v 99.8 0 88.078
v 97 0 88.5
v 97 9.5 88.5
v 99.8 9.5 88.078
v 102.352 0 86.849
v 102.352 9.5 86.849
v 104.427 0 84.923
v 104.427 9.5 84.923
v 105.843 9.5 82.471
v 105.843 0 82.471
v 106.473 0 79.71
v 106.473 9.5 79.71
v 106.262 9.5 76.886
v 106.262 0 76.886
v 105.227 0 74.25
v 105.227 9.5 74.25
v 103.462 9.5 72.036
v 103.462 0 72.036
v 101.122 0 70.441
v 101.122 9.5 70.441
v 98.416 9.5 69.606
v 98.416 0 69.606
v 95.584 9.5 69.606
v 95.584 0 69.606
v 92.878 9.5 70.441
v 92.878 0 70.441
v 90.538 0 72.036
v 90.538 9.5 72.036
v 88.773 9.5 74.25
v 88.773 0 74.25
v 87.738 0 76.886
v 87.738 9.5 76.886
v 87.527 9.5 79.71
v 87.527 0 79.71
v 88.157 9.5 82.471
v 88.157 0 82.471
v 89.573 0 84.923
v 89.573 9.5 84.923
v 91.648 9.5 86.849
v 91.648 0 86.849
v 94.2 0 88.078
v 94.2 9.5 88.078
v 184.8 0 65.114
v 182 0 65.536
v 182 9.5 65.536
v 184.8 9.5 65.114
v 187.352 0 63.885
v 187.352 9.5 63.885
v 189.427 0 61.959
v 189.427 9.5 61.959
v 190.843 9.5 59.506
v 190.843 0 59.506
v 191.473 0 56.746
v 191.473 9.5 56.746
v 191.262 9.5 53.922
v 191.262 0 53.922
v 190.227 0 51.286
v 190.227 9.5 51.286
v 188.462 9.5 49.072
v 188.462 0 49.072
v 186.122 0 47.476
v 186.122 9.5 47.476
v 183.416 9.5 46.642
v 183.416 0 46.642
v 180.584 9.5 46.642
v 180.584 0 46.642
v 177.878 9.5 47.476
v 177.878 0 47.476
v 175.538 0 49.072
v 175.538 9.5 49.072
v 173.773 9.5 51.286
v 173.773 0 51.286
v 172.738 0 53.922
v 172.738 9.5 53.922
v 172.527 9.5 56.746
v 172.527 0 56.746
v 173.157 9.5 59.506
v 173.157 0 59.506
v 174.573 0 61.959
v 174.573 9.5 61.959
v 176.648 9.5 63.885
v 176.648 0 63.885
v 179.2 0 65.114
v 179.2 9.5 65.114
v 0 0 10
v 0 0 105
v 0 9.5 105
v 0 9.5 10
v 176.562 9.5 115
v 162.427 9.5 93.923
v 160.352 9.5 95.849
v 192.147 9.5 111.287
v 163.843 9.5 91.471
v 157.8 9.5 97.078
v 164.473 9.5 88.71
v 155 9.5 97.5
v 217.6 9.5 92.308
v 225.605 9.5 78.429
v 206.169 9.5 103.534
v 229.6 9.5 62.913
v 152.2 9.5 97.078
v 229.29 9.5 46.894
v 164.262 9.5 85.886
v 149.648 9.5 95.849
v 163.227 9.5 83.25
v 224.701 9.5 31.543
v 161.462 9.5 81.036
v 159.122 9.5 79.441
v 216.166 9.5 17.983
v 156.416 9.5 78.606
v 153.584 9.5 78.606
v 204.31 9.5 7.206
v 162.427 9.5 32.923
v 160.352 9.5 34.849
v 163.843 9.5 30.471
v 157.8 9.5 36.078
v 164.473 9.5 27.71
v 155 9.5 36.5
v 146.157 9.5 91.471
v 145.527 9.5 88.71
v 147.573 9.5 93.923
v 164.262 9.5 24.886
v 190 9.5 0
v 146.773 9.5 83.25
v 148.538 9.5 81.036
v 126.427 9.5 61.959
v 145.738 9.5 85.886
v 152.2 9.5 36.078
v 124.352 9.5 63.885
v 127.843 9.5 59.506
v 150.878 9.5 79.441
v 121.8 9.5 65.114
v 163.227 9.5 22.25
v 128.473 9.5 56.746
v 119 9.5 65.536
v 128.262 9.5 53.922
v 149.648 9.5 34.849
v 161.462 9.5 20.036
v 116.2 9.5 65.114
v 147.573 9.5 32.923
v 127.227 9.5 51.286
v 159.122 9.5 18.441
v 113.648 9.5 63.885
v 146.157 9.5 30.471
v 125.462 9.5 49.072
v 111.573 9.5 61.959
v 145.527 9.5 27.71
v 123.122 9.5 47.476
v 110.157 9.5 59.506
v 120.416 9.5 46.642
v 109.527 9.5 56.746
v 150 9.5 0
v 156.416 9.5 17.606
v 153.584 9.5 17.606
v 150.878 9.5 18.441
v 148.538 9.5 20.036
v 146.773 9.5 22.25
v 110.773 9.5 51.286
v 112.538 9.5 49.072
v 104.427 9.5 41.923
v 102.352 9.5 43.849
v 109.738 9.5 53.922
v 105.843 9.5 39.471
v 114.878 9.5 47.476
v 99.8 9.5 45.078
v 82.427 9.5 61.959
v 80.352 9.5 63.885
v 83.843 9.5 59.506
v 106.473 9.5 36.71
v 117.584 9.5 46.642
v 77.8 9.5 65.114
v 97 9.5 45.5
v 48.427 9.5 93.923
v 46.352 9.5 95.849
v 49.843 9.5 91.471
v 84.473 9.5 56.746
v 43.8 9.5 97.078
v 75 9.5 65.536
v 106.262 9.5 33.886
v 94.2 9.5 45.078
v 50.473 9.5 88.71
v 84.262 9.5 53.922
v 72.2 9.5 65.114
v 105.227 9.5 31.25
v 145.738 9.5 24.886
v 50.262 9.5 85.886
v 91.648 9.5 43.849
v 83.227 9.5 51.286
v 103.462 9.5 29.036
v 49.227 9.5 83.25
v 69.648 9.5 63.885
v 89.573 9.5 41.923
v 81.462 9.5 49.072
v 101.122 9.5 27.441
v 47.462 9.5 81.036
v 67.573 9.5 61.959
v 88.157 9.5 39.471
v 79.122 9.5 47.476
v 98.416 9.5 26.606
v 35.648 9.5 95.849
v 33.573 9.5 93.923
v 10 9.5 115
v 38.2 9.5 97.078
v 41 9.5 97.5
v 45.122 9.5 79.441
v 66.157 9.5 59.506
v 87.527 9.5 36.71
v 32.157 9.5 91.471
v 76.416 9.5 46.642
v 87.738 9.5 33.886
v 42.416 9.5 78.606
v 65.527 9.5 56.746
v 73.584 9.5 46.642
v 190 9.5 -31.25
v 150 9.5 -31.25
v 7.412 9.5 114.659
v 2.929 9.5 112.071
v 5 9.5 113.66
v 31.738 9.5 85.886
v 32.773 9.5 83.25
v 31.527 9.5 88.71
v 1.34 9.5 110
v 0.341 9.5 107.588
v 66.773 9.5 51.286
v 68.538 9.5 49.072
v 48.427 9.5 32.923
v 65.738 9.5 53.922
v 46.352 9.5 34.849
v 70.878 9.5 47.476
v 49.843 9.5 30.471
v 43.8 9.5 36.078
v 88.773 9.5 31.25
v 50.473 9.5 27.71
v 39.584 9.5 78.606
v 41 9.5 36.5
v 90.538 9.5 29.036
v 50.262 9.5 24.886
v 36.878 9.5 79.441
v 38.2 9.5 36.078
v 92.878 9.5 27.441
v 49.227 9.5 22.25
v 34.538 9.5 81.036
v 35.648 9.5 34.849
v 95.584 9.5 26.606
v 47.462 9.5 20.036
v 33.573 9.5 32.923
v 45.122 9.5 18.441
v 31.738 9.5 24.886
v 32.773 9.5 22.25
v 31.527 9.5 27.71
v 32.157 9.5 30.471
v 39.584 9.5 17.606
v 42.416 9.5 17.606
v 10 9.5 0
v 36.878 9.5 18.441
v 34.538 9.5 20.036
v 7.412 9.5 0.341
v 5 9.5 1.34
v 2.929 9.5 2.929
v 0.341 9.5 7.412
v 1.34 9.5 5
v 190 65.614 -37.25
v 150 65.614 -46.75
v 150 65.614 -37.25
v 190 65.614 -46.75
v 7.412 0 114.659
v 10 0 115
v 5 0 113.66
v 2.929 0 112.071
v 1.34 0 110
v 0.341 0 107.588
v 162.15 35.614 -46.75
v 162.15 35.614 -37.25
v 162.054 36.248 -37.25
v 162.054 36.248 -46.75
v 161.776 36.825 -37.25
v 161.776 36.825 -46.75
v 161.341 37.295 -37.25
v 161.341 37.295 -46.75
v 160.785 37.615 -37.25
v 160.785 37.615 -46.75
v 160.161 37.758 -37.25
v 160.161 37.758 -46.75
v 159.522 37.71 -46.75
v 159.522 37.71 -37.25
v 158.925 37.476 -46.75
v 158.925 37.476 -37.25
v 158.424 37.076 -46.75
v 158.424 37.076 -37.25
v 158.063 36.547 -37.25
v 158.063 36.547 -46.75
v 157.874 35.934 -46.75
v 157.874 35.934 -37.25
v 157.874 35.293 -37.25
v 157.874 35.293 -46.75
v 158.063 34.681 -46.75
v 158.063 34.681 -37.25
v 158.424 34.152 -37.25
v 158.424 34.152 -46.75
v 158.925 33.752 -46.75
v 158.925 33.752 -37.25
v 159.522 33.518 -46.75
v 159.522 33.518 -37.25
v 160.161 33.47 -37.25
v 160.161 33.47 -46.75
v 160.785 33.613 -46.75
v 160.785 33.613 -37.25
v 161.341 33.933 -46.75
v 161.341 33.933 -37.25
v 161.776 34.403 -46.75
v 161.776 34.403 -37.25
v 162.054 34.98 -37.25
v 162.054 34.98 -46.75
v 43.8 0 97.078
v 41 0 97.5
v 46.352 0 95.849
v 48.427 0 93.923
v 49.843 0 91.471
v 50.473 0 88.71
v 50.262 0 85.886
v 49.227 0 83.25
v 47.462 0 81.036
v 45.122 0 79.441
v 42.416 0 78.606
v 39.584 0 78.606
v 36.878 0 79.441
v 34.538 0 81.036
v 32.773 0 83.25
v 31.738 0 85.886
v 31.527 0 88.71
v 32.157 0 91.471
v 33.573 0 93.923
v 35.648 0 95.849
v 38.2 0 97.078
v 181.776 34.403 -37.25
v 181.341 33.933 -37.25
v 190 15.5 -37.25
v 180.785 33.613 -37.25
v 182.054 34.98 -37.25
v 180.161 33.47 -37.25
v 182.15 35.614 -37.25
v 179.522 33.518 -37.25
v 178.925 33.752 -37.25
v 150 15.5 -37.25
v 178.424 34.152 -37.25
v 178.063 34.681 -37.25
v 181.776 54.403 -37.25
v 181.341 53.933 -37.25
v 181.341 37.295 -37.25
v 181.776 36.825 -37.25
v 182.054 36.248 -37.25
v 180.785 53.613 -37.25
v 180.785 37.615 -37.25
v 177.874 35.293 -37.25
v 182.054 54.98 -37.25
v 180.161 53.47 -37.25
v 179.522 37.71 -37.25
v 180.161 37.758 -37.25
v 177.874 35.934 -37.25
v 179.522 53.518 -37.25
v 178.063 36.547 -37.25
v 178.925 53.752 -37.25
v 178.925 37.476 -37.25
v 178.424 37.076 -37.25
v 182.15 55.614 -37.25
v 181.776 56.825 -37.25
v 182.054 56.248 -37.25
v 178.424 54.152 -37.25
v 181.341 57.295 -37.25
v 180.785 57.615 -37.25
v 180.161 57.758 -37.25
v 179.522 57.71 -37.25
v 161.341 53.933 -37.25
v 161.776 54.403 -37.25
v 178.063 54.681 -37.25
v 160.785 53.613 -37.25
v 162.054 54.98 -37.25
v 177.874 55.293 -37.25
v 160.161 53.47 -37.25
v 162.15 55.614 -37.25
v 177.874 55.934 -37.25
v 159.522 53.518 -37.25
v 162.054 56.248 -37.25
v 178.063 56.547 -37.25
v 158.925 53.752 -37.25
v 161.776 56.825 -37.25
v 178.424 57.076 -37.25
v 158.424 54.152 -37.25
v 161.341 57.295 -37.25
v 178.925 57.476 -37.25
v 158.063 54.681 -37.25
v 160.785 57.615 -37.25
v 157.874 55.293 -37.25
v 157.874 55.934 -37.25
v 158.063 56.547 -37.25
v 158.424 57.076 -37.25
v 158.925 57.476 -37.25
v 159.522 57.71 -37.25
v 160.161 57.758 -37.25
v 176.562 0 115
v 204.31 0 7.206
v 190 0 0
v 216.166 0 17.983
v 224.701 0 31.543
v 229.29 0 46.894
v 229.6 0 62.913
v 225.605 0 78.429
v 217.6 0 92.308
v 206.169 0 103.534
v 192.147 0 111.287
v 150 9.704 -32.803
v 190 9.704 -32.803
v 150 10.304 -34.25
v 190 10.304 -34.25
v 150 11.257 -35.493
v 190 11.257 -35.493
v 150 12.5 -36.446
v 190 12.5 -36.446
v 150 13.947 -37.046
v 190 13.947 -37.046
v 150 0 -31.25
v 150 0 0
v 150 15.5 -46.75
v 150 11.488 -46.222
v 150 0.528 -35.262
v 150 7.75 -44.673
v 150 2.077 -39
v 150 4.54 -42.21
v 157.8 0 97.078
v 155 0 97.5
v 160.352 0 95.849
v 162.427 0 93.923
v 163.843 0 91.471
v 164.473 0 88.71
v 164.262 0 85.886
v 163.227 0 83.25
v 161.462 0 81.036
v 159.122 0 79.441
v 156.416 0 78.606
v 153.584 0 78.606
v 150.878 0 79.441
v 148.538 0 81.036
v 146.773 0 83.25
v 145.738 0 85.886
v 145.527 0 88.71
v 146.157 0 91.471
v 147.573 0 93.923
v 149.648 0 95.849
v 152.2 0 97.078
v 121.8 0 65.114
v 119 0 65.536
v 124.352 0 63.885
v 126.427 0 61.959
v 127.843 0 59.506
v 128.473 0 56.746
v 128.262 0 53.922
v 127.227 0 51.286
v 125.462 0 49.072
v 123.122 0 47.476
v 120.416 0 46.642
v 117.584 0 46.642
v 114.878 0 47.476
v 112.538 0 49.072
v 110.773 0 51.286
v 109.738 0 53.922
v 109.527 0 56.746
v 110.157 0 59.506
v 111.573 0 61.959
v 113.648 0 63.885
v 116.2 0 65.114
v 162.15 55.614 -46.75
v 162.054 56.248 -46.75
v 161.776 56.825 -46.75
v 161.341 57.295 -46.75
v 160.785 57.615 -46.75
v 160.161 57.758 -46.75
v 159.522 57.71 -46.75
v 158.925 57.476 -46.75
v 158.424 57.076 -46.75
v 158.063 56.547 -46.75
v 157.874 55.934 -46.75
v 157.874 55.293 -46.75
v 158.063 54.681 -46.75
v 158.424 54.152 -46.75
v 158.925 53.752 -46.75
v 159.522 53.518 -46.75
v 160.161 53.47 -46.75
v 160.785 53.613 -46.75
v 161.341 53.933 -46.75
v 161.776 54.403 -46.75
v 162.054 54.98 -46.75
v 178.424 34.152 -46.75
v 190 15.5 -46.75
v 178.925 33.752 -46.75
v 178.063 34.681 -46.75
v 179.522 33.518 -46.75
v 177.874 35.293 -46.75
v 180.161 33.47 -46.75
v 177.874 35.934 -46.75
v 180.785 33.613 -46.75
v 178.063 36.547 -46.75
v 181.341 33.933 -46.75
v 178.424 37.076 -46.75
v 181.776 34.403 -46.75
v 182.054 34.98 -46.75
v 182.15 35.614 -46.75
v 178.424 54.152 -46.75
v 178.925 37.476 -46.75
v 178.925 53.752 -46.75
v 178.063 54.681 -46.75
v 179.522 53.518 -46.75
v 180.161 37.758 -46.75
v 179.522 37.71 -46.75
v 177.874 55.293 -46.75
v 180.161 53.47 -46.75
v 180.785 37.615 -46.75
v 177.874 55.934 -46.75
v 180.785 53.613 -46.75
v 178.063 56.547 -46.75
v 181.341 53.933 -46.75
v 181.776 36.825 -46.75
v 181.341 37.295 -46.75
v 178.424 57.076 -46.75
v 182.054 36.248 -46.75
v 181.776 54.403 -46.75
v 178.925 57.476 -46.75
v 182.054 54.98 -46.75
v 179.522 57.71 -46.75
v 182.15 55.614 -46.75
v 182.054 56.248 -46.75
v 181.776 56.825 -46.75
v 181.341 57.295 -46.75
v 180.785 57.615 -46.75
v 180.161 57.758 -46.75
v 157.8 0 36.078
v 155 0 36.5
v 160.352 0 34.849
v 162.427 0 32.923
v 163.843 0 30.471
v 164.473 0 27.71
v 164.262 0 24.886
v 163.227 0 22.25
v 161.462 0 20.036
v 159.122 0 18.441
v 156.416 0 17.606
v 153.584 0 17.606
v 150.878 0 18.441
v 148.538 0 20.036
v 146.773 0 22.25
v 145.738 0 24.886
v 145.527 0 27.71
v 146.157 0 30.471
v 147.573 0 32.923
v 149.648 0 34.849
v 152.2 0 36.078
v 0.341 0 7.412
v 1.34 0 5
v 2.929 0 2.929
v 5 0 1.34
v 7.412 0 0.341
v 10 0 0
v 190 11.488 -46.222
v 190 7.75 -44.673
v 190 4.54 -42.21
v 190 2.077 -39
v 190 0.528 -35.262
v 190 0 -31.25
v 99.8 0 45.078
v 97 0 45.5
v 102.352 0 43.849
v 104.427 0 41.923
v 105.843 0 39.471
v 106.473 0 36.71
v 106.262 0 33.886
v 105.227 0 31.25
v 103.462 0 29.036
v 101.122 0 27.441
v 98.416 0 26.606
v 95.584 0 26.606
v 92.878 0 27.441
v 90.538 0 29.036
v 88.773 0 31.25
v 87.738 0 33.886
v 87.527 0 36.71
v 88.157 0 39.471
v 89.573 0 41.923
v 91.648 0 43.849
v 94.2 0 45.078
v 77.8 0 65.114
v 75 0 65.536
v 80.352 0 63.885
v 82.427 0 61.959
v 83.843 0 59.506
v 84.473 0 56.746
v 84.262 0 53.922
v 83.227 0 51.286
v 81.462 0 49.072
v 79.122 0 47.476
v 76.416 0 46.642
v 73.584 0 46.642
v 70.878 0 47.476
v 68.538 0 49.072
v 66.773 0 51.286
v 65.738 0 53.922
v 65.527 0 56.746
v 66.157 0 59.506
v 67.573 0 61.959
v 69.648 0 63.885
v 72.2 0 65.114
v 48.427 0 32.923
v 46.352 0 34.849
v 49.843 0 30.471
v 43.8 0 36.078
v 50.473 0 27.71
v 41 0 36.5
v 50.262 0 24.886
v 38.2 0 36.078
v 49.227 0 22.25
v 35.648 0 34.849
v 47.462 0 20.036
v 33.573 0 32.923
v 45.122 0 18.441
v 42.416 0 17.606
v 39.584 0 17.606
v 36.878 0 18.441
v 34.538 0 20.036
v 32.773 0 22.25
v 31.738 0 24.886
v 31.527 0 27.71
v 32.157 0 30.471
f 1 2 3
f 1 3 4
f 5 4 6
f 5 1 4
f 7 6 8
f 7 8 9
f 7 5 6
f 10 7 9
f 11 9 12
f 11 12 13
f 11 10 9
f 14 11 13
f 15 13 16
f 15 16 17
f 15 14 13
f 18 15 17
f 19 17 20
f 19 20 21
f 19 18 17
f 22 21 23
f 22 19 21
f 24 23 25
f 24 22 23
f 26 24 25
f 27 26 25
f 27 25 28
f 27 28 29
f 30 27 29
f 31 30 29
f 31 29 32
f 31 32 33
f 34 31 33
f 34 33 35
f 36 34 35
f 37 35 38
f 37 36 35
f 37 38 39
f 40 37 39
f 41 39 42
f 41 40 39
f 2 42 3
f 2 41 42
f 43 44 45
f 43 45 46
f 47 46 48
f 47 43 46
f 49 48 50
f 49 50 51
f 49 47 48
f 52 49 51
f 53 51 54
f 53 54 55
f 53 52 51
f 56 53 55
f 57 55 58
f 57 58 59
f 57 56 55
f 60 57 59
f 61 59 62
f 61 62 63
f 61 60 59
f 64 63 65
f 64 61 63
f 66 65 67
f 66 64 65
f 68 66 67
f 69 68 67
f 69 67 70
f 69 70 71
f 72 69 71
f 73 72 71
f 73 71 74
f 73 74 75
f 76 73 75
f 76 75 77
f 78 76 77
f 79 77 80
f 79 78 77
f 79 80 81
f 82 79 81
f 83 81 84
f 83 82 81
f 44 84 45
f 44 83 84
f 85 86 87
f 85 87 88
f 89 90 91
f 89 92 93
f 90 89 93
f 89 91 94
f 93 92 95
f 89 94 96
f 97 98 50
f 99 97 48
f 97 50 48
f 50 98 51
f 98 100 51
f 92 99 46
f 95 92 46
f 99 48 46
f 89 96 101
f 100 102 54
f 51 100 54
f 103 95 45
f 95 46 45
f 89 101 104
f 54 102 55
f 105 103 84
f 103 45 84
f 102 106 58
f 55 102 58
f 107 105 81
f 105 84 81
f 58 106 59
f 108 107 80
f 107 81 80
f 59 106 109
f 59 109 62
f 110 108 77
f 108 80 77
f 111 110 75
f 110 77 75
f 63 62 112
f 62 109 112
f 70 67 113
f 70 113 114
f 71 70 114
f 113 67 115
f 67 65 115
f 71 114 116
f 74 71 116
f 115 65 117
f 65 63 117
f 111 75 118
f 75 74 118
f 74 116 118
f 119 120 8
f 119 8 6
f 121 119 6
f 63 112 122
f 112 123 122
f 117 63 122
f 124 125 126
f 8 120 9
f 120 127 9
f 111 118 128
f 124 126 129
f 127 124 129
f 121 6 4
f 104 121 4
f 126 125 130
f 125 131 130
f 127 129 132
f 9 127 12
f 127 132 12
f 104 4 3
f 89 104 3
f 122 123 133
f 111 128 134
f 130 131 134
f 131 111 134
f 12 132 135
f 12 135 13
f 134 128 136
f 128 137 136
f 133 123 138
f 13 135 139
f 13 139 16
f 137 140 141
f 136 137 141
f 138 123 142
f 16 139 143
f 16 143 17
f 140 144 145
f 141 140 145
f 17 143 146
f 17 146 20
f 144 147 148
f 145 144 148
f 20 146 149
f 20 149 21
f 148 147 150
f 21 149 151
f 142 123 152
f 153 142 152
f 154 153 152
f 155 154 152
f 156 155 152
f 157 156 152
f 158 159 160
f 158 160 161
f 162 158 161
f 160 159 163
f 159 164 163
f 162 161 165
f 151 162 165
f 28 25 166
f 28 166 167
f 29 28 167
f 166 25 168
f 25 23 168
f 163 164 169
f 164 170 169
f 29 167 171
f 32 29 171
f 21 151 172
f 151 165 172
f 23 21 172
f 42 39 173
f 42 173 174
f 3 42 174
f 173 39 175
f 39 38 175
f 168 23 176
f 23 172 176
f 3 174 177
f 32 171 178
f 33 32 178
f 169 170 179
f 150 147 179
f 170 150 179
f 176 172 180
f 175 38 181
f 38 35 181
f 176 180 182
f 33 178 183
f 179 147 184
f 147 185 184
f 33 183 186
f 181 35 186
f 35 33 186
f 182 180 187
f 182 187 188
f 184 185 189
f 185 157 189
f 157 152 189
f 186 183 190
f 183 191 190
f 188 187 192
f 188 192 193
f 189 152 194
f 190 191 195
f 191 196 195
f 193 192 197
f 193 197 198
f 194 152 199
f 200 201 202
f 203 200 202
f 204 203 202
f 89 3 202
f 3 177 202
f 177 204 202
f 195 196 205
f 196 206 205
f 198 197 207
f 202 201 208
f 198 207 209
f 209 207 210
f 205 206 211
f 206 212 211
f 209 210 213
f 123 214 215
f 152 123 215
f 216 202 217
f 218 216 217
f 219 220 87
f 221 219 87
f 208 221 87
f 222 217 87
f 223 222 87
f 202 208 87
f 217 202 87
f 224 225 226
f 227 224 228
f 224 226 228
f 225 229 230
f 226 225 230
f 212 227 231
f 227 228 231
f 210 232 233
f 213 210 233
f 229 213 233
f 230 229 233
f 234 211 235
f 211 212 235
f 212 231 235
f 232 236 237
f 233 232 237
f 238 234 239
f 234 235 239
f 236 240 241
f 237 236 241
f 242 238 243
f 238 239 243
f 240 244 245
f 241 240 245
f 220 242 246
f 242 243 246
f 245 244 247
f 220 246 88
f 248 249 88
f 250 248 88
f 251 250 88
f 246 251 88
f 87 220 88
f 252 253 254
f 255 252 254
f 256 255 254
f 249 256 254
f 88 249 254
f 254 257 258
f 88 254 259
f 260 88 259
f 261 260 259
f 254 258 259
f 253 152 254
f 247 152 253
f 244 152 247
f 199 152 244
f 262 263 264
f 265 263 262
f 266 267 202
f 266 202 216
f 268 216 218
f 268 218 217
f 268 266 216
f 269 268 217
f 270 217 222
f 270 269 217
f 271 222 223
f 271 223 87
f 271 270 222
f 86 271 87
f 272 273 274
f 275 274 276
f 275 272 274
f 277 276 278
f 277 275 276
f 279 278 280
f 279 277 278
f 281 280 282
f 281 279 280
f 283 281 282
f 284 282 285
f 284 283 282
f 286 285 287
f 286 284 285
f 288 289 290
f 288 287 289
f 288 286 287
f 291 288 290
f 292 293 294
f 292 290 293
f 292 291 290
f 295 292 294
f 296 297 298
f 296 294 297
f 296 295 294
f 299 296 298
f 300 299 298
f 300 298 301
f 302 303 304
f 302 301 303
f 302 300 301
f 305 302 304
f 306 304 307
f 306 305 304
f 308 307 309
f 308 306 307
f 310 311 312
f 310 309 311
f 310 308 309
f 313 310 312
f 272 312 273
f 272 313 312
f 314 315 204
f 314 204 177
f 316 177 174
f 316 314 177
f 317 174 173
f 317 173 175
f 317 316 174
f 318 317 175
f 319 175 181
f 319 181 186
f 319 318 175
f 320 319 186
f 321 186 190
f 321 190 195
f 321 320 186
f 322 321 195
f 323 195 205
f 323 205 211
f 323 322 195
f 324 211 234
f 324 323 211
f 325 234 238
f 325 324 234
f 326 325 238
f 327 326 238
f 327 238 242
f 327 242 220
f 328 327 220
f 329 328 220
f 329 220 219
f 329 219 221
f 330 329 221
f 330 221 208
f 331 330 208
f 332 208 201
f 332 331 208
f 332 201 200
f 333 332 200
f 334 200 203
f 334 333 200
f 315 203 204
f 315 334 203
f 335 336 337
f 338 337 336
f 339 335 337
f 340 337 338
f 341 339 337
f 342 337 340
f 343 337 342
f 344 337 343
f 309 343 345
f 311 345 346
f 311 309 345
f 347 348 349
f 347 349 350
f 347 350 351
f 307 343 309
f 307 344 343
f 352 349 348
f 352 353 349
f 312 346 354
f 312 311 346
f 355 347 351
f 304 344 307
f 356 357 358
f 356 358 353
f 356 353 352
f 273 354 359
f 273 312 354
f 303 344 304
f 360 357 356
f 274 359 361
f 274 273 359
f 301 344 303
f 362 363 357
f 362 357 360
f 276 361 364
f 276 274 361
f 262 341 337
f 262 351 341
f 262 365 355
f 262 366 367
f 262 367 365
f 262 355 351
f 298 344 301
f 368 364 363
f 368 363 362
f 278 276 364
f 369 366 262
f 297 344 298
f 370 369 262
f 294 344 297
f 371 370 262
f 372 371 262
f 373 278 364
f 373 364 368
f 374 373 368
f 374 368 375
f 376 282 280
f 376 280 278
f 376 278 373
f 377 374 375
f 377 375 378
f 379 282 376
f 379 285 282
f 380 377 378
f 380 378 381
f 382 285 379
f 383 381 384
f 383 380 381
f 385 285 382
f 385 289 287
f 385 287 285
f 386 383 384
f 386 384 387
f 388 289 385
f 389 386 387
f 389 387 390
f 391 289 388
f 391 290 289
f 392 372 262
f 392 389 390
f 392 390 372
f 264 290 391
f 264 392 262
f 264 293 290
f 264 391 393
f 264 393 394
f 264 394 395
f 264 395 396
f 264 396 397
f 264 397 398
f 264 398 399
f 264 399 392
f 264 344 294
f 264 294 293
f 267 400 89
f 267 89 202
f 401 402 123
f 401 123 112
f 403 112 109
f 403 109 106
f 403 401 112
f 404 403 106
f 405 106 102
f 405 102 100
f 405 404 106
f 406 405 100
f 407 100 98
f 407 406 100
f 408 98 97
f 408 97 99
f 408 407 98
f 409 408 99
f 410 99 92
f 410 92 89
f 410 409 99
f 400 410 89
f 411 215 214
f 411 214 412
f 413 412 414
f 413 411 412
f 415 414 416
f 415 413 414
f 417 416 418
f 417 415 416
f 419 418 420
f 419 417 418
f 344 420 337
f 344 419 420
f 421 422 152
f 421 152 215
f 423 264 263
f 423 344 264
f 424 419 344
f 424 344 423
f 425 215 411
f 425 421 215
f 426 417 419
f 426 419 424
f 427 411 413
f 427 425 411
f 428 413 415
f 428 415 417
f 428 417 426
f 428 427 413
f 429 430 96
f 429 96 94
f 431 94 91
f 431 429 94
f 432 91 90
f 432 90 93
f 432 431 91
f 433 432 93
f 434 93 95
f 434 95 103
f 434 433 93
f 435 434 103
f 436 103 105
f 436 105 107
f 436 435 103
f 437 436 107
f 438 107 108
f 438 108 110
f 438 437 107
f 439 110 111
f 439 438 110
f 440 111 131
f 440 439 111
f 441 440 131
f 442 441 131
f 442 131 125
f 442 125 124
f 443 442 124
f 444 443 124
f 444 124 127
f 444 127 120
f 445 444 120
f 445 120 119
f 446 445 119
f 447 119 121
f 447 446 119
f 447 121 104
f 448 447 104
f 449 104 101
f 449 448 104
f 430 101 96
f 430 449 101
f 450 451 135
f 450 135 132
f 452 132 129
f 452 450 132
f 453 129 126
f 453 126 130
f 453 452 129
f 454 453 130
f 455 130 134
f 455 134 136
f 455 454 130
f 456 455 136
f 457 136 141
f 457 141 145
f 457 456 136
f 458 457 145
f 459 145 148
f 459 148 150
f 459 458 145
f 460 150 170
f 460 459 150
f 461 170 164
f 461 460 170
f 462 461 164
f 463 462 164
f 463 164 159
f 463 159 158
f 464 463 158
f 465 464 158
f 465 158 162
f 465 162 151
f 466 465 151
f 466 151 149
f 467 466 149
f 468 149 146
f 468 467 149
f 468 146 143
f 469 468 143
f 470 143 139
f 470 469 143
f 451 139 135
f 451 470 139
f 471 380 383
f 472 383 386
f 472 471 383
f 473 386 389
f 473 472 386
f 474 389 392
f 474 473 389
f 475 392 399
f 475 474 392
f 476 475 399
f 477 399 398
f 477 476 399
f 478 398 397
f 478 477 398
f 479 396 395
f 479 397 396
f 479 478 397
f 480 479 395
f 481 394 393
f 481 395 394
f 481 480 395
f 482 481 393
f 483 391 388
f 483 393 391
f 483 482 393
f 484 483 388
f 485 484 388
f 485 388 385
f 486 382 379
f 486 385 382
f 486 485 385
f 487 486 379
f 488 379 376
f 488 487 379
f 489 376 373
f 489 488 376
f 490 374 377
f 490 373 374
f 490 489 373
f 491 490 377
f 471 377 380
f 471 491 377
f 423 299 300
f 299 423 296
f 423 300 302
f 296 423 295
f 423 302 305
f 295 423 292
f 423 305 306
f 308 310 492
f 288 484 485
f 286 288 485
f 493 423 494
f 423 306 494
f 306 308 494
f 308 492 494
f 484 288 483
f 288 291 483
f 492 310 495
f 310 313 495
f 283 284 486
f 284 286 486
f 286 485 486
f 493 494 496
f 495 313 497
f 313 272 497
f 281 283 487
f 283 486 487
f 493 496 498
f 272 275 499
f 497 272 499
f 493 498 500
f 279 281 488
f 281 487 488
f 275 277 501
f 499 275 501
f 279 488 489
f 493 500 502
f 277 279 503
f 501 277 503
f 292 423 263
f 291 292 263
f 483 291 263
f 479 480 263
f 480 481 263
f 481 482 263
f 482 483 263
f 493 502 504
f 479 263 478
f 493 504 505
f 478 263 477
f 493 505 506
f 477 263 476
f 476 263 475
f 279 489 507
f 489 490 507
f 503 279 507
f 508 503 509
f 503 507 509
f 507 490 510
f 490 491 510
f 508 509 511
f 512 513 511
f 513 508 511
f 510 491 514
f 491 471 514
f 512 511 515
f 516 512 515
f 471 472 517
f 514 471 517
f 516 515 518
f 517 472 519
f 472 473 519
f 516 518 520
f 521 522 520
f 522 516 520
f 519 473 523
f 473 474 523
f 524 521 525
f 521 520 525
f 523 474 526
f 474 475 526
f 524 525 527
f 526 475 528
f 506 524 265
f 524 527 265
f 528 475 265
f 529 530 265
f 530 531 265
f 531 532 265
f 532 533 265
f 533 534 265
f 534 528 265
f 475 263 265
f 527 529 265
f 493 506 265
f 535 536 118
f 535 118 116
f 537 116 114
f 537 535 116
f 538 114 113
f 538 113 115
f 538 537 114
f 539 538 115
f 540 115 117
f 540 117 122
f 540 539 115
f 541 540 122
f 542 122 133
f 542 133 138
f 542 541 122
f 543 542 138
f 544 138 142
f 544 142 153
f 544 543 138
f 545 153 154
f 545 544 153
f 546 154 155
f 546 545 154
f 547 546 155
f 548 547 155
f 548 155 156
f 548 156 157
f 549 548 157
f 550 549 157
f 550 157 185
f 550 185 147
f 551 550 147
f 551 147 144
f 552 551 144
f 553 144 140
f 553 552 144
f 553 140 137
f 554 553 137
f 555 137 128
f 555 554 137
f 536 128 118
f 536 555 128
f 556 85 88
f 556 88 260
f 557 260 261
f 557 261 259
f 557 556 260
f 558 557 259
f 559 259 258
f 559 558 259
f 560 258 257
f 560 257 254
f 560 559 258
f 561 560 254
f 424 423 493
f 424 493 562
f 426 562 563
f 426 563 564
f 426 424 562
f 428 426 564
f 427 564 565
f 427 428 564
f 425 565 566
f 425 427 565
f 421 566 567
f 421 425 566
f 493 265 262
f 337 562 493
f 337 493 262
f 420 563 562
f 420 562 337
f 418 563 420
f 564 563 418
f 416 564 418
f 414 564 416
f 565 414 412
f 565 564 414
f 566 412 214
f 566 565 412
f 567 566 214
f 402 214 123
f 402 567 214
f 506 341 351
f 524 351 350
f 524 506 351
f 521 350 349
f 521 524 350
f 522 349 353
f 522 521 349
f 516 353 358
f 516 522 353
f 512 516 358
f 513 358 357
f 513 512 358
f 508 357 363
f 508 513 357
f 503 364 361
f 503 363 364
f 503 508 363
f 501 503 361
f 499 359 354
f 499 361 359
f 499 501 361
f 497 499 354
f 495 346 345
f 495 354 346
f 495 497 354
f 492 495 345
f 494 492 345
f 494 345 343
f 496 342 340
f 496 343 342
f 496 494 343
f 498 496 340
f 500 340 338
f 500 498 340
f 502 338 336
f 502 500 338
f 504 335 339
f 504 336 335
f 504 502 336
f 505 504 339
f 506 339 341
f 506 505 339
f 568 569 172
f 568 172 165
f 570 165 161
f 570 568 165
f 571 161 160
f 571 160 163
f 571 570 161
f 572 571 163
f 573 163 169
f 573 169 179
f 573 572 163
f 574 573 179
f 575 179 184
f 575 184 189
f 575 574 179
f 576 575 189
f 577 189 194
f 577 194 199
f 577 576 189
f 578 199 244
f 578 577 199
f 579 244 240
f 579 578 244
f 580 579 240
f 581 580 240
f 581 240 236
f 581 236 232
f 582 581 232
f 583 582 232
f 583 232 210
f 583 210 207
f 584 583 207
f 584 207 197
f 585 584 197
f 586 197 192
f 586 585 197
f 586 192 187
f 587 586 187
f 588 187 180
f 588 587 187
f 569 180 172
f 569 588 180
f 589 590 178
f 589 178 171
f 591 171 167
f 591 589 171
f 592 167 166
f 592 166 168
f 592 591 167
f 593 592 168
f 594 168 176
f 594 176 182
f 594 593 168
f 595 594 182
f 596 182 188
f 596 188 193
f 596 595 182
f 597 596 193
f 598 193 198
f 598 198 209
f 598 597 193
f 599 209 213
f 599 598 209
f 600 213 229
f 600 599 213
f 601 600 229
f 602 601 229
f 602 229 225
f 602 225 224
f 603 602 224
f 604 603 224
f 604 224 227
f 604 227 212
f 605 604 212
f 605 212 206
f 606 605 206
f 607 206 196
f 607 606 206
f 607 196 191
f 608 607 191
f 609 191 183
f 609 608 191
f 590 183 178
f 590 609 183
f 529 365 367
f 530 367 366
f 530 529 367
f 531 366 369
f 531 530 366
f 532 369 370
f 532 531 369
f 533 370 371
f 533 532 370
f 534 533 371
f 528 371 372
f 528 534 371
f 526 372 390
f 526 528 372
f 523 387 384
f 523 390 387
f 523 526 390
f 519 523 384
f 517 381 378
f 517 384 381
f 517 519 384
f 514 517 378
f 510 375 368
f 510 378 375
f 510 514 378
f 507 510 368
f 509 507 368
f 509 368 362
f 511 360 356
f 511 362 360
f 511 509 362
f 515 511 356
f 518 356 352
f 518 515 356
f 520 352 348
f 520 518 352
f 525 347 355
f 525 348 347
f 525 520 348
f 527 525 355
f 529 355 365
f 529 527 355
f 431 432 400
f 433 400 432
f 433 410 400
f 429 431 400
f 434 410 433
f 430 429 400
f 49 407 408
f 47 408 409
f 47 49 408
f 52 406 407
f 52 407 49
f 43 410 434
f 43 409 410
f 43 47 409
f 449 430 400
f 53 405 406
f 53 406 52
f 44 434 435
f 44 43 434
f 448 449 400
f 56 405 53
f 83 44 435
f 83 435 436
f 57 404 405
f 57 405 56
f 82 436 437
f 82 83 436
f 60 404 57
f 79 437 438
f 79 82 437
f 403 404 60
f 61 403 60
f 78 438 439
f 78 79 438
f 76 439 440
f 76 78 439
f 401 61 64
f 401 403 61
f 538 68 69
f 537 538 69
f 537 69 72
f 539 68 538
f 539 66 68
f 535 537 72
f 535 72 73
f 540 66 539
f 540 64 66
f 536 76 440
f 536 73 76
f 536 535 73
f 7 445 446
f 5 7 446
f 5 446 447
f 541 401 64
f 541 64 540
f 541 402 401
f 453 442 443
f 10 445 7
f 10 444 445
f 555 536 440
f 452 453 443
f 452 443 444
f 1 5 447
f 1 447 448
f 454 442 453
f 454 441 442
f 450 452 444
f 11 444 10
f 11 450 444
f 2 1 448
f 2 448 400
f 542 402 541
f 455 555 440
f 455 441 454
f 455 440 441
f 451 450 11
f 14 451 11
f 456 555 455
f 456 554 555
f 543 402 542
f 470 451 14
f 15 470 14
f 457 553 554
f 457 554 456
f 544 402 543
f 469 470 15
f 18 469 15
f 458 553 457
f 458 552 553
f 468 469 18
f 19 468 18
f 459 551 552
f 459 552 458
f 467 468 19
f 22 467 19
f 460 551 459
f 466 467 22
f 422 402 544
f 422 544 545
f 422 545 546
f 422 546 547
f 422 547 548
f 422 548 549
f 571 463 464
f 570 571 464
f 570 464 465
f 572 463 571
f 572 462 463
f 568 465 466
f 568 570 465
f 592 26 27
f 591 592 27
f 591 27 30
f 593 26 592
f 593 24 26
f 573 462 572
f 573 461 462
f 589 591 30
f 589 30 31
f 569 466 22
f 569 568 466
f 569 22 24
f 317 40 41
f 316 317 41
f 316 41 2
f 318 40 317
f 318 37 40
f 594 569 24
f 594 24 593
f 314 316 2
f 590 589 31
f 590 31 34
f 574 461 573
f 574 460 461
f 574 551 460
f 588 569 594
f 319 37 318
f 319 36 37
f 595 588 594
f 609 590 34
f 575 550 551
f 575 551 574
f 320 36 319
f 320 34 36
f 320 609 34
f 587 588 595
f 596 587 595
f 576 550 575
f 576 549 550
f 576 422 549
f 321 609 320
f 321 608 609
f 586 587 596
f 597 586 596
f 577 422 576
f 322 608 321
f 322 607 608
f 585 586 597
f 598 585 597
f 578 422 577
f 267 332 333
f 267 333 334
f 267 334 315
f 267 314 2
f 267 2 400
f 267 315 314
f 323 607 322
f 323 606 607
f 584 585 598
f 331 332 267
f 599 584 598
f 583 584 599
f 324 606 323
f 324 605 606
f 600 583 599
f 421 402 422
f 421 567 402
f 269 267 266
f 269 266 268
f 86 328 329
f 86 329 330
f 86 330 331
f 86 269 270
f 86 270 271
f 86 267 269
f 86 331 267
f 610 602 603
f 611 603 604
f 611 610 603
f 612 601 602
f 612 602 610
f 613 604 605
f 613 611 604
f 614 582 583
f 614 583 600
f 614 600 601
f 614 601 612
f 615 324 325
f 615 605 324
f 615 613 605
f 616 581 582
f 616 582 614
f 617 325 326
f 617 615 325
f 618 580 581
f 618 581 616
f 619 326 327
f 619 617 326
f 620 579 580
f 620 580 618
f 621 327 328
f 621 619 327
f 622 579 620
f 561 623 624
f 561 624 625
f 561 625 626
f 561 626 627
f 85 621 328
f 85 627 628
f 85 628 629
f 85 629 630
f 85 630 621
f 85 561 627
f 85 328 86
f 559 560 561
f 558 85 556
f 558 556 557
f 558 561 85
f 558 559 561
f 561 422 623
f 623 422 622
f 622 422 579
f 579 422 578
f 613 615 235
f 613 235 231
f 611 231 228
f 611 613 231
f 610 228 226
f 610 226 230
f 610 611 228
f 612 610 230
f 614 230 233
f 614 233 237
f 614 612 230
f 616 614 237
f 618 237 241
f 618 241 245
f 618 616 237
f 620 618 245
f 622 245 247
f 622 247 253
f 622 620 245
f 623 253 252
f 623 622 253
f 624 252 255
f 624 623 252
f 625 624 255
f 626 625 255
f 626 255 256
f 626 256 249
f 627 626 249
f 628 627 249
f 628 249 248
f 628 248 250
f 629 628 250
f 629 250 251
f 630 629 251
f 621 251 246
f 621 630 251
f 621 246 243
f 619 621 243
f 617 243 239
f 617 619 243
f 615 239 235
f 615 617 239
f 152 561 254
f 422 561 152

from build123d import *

# Parameters (mm, degrees)
SKETCH1_R                  = 9.5
SKETCH1_R_2                = 2.15
BASE_FLANGE1_DEPTH         = 9.5
SKETCHED_START             = -98.25
SKETCHED_BEND1_OUTLINE_W   = 40
SKETCHED_BEND1_OUTLINE_H   = 9.5
SKETCHED_BEND1_DEPTH       = 51.5
SKETCHED_START_2           = -45.24247
SKETCHED_BEND1_2_OUTLINE_W = 40
SKETCHED_BEND1_2_OUTLINE_H = 56.113939487
SKETCHED_BEND1_2_OUTLINE_R = 2.15
SKETCHED_BEND1_2_DEPTH     = 7.99247
SKETCHED_START_3           = -46.75
SKETCHED_BEND1_3_OUTLINE_W = 40
SKETCHED_BEND1_3_OUTLINE_H = 56.113939487
SKETCHED_BEND1_3_OUTLINE_R = 2.15
SKETCHED_BEND1_3_DEPTH     = 15.5
SKETCHED_START_4           = 150
SKETCHED_BEND1_4_DEPTH     = 40


with BuildPart() as part:
    # Base-Flange1: sheet metal written as solids
    # Sketch1 → Base-Flange1 (new body)
    with BuildSketch(Plane(origin=(0, 0, 0), x_dir=(1, 0, 0), z_dir=(0, 1, 0))):
        with BuildLine():
            Line((0, -105), (0, -10))
            ThreePointArc((0, -10), (2.928932188, -2.928932188), (10, 0))
            Line((10, 0), (150, 0))
            Line((150, 0), (150, 98.25))
            Line((150, 98.25), (190, 98.25))
            Line((190, 98.25), (190, 0))
            ThreePointArc((190, 0), (229.599557186, -62.912629471), (176.5615547, -115))
            Line((176.5615547, -115), (10, -115))
            ThreePointArc((10, -115), (2.928932188, -112.071067812), (0, -105))
        make_face()
        with Locations(Location((41, -27, 0), (0, 0, 270))):
            Circle(SKETCH1_R, mode=Mode.SUBTRACT)
        with Locations(Location((41, -88, 0), (0, 0, 270))):
            Circle(SKETCH1_R, mode=Mode.SUBTRACT)
        with Locations(Location((160, 88.25, 0), (0, 0, 270))):
            Circle(SKETCH1_R_2, mode=Mode.SUBTRACT)
        with Locations(Location((180, 88.25, 0), (0, 0, 270))):
            Circle(SKETCH1_R_2, mode=Mode.SUBTRACT)
        with Locations(Location((180, 68.25, 0), (0, 0, 270))):
            Circle(SKETCH1_R_2, mode=Mode.SUBTRACT)
        with Locations(Location((160, 68.25, 0), (0, 0, 270))):
            Circle(SKETCH1_R_2, mode=Mode.SUBTRACT)
        with Locations(Location((75, -56.035702904, 0), (0, 0, 270))):
            Circle(SKETCH1_R, mode=Mode.SUBTRACT)
        with Locations(Location((119, -56.035702904, 0), (0, 0, 270))):
            Circle(SKETCH1_R, mode=Mode.SUBTRACT)
        with Locations(Location((97, -36, 0), (0, 0, 270))):
            Circle(SKETCH1_R, mode=Mode.SUBTRACT)
        with Locations(Location((97, -79, 0), (0, 0, 270))):
            Circle(SKETCH1_R, mode=Mode.SUBTRACT)
        with Locations(Location((155, -27, 0), (0, 0, 270))):
            Circle(SKETCH1_R, mode=Mode.SUBTRACT)
        with Locations(Location((182, -56.035702904, 0), (0, 0, 270))):
            Circle(SKETCH1_R, mode=Mode.SUBTRACT)
        with Locations(Location((155, -88, 0), (0, 0, 270))):
            Circle(SKETCH1_R, mode=Mode.SUBTRACT)
    extrude(amount=BASE_FLANGE1_DEPTH)

    # Sketched Bend1: read off the stored shape, not the designer's step
    # Sketched Bend1 outline → Sketched Bend1 (cut)
    with BuildSketch(Plane.XY.offset(SKETCHED_START)):
        with Locations((170, 4.75)):
            Rectangle(SKETCHED_BEND1_OUTLINE_W, SKETCHED_BEND1_OUTLINE_H)
    extrude(amount=SKETCHED_BEND1_DEPTH, mode=Mode.SUBTRACT)

    # Sketched Bend1 2 outline → Sketched Bend1 2 (add)
    with BuildSketch(Plane.XY.offset(SKETCHED_START_2)):
        with Locations((170, 37.556969744)):
            Rectangle(SKETCHED_BEND1_2_OUTLINE_W, SKETCHED_BEND1_2_OUTLINE_H)
        with Locations((160, 35.613939487)):
            Circle(SKETCHED_BEND1_2_OUTLINE_R, mode=Mode.SUBTRACT)
        with Locations((160, 55.613939487)):
            Circle(SKETCHED_BEND1_2_OUTLINE_R, mode=Mode.SUBTRACT)
        with Locations((180, 35.613939487)):
            Circle(SKETCHED_BEND1_2_OUTLINE_R, mode=Mode.SUBTRACT)
        with Locations((180, 55.613939487)):
            Circle(SKETCHED_BEND1_2_OUTLINE_R, mode=Mode.SUBTRACT)
    extrude(amount=SKETCHED_BEND1_2_DEPTH)

    # Sketched Bend1 3 outline → Sketched Bend1 3 (add)
    with BuildSketch(Plane.XY.offset(SKETCHED_START_3)):
        with Locations((170, 37.556969744)):
            Rectangle(SKETCHED_BEND1_3_OUTLINE_W, SKETCHED_BEND1_3_OUTLINE_H)
        with Locations((160, 35.613939487)):
            Circle(SKETCHED_BEND1_3_OUTLINE_R, mode=Mode.SUBTRACT)
        with Locations((180, 35.613939487)):
            Circle(SKETCHED_BEND1_3_OUTLINE_R, mode=Mode.SUBTRACT)
        with Locations((160, 55.613939487)):
            Circle(SKETCHED_BEND1_3_OUTLINE_R, mode=Mode.SUBTRACT)
        with Locations((180, 55.613939487)):
            Circle(SKETCHED_BEND1_3_OUTLINE_R, mode=Mode.SUBTRACT)
    extrude(amount=SKETCHED_BEND1_3_DEPTH)

    # Sketched Bend1 4 outline → Sketched Bend1 4 (cut)
    with BuildSketch(Plane.YZ.offset(SKETCHED_START_4)):
        with BuildLine():
            ThreePointArc((9.5, -31.25), (11.257359313, -35.492640687), (15.5, -37.25))
            Line((15.5, -37.25), (65.613939487, -37.25))
            Line((65.613939487, -37.25), (65.613939487, -31.25))
            Line((65.613939487, -31.25), (9.5, -31.25))
        make_face()
        with BuildLine():
            Line((0, -46.75), (15.5, -46.75))
            ThreePointArc((15.5, -46.75), (4.539844892, -42.210155108), (0, -31.25))
            Line((0, -31.25), (0, -46.75))
        make_face()
    extrude(amount=SKETCHED_BEND1_4_DEPTH, mode=Mode.SUBTRACT)


solid = part.part
